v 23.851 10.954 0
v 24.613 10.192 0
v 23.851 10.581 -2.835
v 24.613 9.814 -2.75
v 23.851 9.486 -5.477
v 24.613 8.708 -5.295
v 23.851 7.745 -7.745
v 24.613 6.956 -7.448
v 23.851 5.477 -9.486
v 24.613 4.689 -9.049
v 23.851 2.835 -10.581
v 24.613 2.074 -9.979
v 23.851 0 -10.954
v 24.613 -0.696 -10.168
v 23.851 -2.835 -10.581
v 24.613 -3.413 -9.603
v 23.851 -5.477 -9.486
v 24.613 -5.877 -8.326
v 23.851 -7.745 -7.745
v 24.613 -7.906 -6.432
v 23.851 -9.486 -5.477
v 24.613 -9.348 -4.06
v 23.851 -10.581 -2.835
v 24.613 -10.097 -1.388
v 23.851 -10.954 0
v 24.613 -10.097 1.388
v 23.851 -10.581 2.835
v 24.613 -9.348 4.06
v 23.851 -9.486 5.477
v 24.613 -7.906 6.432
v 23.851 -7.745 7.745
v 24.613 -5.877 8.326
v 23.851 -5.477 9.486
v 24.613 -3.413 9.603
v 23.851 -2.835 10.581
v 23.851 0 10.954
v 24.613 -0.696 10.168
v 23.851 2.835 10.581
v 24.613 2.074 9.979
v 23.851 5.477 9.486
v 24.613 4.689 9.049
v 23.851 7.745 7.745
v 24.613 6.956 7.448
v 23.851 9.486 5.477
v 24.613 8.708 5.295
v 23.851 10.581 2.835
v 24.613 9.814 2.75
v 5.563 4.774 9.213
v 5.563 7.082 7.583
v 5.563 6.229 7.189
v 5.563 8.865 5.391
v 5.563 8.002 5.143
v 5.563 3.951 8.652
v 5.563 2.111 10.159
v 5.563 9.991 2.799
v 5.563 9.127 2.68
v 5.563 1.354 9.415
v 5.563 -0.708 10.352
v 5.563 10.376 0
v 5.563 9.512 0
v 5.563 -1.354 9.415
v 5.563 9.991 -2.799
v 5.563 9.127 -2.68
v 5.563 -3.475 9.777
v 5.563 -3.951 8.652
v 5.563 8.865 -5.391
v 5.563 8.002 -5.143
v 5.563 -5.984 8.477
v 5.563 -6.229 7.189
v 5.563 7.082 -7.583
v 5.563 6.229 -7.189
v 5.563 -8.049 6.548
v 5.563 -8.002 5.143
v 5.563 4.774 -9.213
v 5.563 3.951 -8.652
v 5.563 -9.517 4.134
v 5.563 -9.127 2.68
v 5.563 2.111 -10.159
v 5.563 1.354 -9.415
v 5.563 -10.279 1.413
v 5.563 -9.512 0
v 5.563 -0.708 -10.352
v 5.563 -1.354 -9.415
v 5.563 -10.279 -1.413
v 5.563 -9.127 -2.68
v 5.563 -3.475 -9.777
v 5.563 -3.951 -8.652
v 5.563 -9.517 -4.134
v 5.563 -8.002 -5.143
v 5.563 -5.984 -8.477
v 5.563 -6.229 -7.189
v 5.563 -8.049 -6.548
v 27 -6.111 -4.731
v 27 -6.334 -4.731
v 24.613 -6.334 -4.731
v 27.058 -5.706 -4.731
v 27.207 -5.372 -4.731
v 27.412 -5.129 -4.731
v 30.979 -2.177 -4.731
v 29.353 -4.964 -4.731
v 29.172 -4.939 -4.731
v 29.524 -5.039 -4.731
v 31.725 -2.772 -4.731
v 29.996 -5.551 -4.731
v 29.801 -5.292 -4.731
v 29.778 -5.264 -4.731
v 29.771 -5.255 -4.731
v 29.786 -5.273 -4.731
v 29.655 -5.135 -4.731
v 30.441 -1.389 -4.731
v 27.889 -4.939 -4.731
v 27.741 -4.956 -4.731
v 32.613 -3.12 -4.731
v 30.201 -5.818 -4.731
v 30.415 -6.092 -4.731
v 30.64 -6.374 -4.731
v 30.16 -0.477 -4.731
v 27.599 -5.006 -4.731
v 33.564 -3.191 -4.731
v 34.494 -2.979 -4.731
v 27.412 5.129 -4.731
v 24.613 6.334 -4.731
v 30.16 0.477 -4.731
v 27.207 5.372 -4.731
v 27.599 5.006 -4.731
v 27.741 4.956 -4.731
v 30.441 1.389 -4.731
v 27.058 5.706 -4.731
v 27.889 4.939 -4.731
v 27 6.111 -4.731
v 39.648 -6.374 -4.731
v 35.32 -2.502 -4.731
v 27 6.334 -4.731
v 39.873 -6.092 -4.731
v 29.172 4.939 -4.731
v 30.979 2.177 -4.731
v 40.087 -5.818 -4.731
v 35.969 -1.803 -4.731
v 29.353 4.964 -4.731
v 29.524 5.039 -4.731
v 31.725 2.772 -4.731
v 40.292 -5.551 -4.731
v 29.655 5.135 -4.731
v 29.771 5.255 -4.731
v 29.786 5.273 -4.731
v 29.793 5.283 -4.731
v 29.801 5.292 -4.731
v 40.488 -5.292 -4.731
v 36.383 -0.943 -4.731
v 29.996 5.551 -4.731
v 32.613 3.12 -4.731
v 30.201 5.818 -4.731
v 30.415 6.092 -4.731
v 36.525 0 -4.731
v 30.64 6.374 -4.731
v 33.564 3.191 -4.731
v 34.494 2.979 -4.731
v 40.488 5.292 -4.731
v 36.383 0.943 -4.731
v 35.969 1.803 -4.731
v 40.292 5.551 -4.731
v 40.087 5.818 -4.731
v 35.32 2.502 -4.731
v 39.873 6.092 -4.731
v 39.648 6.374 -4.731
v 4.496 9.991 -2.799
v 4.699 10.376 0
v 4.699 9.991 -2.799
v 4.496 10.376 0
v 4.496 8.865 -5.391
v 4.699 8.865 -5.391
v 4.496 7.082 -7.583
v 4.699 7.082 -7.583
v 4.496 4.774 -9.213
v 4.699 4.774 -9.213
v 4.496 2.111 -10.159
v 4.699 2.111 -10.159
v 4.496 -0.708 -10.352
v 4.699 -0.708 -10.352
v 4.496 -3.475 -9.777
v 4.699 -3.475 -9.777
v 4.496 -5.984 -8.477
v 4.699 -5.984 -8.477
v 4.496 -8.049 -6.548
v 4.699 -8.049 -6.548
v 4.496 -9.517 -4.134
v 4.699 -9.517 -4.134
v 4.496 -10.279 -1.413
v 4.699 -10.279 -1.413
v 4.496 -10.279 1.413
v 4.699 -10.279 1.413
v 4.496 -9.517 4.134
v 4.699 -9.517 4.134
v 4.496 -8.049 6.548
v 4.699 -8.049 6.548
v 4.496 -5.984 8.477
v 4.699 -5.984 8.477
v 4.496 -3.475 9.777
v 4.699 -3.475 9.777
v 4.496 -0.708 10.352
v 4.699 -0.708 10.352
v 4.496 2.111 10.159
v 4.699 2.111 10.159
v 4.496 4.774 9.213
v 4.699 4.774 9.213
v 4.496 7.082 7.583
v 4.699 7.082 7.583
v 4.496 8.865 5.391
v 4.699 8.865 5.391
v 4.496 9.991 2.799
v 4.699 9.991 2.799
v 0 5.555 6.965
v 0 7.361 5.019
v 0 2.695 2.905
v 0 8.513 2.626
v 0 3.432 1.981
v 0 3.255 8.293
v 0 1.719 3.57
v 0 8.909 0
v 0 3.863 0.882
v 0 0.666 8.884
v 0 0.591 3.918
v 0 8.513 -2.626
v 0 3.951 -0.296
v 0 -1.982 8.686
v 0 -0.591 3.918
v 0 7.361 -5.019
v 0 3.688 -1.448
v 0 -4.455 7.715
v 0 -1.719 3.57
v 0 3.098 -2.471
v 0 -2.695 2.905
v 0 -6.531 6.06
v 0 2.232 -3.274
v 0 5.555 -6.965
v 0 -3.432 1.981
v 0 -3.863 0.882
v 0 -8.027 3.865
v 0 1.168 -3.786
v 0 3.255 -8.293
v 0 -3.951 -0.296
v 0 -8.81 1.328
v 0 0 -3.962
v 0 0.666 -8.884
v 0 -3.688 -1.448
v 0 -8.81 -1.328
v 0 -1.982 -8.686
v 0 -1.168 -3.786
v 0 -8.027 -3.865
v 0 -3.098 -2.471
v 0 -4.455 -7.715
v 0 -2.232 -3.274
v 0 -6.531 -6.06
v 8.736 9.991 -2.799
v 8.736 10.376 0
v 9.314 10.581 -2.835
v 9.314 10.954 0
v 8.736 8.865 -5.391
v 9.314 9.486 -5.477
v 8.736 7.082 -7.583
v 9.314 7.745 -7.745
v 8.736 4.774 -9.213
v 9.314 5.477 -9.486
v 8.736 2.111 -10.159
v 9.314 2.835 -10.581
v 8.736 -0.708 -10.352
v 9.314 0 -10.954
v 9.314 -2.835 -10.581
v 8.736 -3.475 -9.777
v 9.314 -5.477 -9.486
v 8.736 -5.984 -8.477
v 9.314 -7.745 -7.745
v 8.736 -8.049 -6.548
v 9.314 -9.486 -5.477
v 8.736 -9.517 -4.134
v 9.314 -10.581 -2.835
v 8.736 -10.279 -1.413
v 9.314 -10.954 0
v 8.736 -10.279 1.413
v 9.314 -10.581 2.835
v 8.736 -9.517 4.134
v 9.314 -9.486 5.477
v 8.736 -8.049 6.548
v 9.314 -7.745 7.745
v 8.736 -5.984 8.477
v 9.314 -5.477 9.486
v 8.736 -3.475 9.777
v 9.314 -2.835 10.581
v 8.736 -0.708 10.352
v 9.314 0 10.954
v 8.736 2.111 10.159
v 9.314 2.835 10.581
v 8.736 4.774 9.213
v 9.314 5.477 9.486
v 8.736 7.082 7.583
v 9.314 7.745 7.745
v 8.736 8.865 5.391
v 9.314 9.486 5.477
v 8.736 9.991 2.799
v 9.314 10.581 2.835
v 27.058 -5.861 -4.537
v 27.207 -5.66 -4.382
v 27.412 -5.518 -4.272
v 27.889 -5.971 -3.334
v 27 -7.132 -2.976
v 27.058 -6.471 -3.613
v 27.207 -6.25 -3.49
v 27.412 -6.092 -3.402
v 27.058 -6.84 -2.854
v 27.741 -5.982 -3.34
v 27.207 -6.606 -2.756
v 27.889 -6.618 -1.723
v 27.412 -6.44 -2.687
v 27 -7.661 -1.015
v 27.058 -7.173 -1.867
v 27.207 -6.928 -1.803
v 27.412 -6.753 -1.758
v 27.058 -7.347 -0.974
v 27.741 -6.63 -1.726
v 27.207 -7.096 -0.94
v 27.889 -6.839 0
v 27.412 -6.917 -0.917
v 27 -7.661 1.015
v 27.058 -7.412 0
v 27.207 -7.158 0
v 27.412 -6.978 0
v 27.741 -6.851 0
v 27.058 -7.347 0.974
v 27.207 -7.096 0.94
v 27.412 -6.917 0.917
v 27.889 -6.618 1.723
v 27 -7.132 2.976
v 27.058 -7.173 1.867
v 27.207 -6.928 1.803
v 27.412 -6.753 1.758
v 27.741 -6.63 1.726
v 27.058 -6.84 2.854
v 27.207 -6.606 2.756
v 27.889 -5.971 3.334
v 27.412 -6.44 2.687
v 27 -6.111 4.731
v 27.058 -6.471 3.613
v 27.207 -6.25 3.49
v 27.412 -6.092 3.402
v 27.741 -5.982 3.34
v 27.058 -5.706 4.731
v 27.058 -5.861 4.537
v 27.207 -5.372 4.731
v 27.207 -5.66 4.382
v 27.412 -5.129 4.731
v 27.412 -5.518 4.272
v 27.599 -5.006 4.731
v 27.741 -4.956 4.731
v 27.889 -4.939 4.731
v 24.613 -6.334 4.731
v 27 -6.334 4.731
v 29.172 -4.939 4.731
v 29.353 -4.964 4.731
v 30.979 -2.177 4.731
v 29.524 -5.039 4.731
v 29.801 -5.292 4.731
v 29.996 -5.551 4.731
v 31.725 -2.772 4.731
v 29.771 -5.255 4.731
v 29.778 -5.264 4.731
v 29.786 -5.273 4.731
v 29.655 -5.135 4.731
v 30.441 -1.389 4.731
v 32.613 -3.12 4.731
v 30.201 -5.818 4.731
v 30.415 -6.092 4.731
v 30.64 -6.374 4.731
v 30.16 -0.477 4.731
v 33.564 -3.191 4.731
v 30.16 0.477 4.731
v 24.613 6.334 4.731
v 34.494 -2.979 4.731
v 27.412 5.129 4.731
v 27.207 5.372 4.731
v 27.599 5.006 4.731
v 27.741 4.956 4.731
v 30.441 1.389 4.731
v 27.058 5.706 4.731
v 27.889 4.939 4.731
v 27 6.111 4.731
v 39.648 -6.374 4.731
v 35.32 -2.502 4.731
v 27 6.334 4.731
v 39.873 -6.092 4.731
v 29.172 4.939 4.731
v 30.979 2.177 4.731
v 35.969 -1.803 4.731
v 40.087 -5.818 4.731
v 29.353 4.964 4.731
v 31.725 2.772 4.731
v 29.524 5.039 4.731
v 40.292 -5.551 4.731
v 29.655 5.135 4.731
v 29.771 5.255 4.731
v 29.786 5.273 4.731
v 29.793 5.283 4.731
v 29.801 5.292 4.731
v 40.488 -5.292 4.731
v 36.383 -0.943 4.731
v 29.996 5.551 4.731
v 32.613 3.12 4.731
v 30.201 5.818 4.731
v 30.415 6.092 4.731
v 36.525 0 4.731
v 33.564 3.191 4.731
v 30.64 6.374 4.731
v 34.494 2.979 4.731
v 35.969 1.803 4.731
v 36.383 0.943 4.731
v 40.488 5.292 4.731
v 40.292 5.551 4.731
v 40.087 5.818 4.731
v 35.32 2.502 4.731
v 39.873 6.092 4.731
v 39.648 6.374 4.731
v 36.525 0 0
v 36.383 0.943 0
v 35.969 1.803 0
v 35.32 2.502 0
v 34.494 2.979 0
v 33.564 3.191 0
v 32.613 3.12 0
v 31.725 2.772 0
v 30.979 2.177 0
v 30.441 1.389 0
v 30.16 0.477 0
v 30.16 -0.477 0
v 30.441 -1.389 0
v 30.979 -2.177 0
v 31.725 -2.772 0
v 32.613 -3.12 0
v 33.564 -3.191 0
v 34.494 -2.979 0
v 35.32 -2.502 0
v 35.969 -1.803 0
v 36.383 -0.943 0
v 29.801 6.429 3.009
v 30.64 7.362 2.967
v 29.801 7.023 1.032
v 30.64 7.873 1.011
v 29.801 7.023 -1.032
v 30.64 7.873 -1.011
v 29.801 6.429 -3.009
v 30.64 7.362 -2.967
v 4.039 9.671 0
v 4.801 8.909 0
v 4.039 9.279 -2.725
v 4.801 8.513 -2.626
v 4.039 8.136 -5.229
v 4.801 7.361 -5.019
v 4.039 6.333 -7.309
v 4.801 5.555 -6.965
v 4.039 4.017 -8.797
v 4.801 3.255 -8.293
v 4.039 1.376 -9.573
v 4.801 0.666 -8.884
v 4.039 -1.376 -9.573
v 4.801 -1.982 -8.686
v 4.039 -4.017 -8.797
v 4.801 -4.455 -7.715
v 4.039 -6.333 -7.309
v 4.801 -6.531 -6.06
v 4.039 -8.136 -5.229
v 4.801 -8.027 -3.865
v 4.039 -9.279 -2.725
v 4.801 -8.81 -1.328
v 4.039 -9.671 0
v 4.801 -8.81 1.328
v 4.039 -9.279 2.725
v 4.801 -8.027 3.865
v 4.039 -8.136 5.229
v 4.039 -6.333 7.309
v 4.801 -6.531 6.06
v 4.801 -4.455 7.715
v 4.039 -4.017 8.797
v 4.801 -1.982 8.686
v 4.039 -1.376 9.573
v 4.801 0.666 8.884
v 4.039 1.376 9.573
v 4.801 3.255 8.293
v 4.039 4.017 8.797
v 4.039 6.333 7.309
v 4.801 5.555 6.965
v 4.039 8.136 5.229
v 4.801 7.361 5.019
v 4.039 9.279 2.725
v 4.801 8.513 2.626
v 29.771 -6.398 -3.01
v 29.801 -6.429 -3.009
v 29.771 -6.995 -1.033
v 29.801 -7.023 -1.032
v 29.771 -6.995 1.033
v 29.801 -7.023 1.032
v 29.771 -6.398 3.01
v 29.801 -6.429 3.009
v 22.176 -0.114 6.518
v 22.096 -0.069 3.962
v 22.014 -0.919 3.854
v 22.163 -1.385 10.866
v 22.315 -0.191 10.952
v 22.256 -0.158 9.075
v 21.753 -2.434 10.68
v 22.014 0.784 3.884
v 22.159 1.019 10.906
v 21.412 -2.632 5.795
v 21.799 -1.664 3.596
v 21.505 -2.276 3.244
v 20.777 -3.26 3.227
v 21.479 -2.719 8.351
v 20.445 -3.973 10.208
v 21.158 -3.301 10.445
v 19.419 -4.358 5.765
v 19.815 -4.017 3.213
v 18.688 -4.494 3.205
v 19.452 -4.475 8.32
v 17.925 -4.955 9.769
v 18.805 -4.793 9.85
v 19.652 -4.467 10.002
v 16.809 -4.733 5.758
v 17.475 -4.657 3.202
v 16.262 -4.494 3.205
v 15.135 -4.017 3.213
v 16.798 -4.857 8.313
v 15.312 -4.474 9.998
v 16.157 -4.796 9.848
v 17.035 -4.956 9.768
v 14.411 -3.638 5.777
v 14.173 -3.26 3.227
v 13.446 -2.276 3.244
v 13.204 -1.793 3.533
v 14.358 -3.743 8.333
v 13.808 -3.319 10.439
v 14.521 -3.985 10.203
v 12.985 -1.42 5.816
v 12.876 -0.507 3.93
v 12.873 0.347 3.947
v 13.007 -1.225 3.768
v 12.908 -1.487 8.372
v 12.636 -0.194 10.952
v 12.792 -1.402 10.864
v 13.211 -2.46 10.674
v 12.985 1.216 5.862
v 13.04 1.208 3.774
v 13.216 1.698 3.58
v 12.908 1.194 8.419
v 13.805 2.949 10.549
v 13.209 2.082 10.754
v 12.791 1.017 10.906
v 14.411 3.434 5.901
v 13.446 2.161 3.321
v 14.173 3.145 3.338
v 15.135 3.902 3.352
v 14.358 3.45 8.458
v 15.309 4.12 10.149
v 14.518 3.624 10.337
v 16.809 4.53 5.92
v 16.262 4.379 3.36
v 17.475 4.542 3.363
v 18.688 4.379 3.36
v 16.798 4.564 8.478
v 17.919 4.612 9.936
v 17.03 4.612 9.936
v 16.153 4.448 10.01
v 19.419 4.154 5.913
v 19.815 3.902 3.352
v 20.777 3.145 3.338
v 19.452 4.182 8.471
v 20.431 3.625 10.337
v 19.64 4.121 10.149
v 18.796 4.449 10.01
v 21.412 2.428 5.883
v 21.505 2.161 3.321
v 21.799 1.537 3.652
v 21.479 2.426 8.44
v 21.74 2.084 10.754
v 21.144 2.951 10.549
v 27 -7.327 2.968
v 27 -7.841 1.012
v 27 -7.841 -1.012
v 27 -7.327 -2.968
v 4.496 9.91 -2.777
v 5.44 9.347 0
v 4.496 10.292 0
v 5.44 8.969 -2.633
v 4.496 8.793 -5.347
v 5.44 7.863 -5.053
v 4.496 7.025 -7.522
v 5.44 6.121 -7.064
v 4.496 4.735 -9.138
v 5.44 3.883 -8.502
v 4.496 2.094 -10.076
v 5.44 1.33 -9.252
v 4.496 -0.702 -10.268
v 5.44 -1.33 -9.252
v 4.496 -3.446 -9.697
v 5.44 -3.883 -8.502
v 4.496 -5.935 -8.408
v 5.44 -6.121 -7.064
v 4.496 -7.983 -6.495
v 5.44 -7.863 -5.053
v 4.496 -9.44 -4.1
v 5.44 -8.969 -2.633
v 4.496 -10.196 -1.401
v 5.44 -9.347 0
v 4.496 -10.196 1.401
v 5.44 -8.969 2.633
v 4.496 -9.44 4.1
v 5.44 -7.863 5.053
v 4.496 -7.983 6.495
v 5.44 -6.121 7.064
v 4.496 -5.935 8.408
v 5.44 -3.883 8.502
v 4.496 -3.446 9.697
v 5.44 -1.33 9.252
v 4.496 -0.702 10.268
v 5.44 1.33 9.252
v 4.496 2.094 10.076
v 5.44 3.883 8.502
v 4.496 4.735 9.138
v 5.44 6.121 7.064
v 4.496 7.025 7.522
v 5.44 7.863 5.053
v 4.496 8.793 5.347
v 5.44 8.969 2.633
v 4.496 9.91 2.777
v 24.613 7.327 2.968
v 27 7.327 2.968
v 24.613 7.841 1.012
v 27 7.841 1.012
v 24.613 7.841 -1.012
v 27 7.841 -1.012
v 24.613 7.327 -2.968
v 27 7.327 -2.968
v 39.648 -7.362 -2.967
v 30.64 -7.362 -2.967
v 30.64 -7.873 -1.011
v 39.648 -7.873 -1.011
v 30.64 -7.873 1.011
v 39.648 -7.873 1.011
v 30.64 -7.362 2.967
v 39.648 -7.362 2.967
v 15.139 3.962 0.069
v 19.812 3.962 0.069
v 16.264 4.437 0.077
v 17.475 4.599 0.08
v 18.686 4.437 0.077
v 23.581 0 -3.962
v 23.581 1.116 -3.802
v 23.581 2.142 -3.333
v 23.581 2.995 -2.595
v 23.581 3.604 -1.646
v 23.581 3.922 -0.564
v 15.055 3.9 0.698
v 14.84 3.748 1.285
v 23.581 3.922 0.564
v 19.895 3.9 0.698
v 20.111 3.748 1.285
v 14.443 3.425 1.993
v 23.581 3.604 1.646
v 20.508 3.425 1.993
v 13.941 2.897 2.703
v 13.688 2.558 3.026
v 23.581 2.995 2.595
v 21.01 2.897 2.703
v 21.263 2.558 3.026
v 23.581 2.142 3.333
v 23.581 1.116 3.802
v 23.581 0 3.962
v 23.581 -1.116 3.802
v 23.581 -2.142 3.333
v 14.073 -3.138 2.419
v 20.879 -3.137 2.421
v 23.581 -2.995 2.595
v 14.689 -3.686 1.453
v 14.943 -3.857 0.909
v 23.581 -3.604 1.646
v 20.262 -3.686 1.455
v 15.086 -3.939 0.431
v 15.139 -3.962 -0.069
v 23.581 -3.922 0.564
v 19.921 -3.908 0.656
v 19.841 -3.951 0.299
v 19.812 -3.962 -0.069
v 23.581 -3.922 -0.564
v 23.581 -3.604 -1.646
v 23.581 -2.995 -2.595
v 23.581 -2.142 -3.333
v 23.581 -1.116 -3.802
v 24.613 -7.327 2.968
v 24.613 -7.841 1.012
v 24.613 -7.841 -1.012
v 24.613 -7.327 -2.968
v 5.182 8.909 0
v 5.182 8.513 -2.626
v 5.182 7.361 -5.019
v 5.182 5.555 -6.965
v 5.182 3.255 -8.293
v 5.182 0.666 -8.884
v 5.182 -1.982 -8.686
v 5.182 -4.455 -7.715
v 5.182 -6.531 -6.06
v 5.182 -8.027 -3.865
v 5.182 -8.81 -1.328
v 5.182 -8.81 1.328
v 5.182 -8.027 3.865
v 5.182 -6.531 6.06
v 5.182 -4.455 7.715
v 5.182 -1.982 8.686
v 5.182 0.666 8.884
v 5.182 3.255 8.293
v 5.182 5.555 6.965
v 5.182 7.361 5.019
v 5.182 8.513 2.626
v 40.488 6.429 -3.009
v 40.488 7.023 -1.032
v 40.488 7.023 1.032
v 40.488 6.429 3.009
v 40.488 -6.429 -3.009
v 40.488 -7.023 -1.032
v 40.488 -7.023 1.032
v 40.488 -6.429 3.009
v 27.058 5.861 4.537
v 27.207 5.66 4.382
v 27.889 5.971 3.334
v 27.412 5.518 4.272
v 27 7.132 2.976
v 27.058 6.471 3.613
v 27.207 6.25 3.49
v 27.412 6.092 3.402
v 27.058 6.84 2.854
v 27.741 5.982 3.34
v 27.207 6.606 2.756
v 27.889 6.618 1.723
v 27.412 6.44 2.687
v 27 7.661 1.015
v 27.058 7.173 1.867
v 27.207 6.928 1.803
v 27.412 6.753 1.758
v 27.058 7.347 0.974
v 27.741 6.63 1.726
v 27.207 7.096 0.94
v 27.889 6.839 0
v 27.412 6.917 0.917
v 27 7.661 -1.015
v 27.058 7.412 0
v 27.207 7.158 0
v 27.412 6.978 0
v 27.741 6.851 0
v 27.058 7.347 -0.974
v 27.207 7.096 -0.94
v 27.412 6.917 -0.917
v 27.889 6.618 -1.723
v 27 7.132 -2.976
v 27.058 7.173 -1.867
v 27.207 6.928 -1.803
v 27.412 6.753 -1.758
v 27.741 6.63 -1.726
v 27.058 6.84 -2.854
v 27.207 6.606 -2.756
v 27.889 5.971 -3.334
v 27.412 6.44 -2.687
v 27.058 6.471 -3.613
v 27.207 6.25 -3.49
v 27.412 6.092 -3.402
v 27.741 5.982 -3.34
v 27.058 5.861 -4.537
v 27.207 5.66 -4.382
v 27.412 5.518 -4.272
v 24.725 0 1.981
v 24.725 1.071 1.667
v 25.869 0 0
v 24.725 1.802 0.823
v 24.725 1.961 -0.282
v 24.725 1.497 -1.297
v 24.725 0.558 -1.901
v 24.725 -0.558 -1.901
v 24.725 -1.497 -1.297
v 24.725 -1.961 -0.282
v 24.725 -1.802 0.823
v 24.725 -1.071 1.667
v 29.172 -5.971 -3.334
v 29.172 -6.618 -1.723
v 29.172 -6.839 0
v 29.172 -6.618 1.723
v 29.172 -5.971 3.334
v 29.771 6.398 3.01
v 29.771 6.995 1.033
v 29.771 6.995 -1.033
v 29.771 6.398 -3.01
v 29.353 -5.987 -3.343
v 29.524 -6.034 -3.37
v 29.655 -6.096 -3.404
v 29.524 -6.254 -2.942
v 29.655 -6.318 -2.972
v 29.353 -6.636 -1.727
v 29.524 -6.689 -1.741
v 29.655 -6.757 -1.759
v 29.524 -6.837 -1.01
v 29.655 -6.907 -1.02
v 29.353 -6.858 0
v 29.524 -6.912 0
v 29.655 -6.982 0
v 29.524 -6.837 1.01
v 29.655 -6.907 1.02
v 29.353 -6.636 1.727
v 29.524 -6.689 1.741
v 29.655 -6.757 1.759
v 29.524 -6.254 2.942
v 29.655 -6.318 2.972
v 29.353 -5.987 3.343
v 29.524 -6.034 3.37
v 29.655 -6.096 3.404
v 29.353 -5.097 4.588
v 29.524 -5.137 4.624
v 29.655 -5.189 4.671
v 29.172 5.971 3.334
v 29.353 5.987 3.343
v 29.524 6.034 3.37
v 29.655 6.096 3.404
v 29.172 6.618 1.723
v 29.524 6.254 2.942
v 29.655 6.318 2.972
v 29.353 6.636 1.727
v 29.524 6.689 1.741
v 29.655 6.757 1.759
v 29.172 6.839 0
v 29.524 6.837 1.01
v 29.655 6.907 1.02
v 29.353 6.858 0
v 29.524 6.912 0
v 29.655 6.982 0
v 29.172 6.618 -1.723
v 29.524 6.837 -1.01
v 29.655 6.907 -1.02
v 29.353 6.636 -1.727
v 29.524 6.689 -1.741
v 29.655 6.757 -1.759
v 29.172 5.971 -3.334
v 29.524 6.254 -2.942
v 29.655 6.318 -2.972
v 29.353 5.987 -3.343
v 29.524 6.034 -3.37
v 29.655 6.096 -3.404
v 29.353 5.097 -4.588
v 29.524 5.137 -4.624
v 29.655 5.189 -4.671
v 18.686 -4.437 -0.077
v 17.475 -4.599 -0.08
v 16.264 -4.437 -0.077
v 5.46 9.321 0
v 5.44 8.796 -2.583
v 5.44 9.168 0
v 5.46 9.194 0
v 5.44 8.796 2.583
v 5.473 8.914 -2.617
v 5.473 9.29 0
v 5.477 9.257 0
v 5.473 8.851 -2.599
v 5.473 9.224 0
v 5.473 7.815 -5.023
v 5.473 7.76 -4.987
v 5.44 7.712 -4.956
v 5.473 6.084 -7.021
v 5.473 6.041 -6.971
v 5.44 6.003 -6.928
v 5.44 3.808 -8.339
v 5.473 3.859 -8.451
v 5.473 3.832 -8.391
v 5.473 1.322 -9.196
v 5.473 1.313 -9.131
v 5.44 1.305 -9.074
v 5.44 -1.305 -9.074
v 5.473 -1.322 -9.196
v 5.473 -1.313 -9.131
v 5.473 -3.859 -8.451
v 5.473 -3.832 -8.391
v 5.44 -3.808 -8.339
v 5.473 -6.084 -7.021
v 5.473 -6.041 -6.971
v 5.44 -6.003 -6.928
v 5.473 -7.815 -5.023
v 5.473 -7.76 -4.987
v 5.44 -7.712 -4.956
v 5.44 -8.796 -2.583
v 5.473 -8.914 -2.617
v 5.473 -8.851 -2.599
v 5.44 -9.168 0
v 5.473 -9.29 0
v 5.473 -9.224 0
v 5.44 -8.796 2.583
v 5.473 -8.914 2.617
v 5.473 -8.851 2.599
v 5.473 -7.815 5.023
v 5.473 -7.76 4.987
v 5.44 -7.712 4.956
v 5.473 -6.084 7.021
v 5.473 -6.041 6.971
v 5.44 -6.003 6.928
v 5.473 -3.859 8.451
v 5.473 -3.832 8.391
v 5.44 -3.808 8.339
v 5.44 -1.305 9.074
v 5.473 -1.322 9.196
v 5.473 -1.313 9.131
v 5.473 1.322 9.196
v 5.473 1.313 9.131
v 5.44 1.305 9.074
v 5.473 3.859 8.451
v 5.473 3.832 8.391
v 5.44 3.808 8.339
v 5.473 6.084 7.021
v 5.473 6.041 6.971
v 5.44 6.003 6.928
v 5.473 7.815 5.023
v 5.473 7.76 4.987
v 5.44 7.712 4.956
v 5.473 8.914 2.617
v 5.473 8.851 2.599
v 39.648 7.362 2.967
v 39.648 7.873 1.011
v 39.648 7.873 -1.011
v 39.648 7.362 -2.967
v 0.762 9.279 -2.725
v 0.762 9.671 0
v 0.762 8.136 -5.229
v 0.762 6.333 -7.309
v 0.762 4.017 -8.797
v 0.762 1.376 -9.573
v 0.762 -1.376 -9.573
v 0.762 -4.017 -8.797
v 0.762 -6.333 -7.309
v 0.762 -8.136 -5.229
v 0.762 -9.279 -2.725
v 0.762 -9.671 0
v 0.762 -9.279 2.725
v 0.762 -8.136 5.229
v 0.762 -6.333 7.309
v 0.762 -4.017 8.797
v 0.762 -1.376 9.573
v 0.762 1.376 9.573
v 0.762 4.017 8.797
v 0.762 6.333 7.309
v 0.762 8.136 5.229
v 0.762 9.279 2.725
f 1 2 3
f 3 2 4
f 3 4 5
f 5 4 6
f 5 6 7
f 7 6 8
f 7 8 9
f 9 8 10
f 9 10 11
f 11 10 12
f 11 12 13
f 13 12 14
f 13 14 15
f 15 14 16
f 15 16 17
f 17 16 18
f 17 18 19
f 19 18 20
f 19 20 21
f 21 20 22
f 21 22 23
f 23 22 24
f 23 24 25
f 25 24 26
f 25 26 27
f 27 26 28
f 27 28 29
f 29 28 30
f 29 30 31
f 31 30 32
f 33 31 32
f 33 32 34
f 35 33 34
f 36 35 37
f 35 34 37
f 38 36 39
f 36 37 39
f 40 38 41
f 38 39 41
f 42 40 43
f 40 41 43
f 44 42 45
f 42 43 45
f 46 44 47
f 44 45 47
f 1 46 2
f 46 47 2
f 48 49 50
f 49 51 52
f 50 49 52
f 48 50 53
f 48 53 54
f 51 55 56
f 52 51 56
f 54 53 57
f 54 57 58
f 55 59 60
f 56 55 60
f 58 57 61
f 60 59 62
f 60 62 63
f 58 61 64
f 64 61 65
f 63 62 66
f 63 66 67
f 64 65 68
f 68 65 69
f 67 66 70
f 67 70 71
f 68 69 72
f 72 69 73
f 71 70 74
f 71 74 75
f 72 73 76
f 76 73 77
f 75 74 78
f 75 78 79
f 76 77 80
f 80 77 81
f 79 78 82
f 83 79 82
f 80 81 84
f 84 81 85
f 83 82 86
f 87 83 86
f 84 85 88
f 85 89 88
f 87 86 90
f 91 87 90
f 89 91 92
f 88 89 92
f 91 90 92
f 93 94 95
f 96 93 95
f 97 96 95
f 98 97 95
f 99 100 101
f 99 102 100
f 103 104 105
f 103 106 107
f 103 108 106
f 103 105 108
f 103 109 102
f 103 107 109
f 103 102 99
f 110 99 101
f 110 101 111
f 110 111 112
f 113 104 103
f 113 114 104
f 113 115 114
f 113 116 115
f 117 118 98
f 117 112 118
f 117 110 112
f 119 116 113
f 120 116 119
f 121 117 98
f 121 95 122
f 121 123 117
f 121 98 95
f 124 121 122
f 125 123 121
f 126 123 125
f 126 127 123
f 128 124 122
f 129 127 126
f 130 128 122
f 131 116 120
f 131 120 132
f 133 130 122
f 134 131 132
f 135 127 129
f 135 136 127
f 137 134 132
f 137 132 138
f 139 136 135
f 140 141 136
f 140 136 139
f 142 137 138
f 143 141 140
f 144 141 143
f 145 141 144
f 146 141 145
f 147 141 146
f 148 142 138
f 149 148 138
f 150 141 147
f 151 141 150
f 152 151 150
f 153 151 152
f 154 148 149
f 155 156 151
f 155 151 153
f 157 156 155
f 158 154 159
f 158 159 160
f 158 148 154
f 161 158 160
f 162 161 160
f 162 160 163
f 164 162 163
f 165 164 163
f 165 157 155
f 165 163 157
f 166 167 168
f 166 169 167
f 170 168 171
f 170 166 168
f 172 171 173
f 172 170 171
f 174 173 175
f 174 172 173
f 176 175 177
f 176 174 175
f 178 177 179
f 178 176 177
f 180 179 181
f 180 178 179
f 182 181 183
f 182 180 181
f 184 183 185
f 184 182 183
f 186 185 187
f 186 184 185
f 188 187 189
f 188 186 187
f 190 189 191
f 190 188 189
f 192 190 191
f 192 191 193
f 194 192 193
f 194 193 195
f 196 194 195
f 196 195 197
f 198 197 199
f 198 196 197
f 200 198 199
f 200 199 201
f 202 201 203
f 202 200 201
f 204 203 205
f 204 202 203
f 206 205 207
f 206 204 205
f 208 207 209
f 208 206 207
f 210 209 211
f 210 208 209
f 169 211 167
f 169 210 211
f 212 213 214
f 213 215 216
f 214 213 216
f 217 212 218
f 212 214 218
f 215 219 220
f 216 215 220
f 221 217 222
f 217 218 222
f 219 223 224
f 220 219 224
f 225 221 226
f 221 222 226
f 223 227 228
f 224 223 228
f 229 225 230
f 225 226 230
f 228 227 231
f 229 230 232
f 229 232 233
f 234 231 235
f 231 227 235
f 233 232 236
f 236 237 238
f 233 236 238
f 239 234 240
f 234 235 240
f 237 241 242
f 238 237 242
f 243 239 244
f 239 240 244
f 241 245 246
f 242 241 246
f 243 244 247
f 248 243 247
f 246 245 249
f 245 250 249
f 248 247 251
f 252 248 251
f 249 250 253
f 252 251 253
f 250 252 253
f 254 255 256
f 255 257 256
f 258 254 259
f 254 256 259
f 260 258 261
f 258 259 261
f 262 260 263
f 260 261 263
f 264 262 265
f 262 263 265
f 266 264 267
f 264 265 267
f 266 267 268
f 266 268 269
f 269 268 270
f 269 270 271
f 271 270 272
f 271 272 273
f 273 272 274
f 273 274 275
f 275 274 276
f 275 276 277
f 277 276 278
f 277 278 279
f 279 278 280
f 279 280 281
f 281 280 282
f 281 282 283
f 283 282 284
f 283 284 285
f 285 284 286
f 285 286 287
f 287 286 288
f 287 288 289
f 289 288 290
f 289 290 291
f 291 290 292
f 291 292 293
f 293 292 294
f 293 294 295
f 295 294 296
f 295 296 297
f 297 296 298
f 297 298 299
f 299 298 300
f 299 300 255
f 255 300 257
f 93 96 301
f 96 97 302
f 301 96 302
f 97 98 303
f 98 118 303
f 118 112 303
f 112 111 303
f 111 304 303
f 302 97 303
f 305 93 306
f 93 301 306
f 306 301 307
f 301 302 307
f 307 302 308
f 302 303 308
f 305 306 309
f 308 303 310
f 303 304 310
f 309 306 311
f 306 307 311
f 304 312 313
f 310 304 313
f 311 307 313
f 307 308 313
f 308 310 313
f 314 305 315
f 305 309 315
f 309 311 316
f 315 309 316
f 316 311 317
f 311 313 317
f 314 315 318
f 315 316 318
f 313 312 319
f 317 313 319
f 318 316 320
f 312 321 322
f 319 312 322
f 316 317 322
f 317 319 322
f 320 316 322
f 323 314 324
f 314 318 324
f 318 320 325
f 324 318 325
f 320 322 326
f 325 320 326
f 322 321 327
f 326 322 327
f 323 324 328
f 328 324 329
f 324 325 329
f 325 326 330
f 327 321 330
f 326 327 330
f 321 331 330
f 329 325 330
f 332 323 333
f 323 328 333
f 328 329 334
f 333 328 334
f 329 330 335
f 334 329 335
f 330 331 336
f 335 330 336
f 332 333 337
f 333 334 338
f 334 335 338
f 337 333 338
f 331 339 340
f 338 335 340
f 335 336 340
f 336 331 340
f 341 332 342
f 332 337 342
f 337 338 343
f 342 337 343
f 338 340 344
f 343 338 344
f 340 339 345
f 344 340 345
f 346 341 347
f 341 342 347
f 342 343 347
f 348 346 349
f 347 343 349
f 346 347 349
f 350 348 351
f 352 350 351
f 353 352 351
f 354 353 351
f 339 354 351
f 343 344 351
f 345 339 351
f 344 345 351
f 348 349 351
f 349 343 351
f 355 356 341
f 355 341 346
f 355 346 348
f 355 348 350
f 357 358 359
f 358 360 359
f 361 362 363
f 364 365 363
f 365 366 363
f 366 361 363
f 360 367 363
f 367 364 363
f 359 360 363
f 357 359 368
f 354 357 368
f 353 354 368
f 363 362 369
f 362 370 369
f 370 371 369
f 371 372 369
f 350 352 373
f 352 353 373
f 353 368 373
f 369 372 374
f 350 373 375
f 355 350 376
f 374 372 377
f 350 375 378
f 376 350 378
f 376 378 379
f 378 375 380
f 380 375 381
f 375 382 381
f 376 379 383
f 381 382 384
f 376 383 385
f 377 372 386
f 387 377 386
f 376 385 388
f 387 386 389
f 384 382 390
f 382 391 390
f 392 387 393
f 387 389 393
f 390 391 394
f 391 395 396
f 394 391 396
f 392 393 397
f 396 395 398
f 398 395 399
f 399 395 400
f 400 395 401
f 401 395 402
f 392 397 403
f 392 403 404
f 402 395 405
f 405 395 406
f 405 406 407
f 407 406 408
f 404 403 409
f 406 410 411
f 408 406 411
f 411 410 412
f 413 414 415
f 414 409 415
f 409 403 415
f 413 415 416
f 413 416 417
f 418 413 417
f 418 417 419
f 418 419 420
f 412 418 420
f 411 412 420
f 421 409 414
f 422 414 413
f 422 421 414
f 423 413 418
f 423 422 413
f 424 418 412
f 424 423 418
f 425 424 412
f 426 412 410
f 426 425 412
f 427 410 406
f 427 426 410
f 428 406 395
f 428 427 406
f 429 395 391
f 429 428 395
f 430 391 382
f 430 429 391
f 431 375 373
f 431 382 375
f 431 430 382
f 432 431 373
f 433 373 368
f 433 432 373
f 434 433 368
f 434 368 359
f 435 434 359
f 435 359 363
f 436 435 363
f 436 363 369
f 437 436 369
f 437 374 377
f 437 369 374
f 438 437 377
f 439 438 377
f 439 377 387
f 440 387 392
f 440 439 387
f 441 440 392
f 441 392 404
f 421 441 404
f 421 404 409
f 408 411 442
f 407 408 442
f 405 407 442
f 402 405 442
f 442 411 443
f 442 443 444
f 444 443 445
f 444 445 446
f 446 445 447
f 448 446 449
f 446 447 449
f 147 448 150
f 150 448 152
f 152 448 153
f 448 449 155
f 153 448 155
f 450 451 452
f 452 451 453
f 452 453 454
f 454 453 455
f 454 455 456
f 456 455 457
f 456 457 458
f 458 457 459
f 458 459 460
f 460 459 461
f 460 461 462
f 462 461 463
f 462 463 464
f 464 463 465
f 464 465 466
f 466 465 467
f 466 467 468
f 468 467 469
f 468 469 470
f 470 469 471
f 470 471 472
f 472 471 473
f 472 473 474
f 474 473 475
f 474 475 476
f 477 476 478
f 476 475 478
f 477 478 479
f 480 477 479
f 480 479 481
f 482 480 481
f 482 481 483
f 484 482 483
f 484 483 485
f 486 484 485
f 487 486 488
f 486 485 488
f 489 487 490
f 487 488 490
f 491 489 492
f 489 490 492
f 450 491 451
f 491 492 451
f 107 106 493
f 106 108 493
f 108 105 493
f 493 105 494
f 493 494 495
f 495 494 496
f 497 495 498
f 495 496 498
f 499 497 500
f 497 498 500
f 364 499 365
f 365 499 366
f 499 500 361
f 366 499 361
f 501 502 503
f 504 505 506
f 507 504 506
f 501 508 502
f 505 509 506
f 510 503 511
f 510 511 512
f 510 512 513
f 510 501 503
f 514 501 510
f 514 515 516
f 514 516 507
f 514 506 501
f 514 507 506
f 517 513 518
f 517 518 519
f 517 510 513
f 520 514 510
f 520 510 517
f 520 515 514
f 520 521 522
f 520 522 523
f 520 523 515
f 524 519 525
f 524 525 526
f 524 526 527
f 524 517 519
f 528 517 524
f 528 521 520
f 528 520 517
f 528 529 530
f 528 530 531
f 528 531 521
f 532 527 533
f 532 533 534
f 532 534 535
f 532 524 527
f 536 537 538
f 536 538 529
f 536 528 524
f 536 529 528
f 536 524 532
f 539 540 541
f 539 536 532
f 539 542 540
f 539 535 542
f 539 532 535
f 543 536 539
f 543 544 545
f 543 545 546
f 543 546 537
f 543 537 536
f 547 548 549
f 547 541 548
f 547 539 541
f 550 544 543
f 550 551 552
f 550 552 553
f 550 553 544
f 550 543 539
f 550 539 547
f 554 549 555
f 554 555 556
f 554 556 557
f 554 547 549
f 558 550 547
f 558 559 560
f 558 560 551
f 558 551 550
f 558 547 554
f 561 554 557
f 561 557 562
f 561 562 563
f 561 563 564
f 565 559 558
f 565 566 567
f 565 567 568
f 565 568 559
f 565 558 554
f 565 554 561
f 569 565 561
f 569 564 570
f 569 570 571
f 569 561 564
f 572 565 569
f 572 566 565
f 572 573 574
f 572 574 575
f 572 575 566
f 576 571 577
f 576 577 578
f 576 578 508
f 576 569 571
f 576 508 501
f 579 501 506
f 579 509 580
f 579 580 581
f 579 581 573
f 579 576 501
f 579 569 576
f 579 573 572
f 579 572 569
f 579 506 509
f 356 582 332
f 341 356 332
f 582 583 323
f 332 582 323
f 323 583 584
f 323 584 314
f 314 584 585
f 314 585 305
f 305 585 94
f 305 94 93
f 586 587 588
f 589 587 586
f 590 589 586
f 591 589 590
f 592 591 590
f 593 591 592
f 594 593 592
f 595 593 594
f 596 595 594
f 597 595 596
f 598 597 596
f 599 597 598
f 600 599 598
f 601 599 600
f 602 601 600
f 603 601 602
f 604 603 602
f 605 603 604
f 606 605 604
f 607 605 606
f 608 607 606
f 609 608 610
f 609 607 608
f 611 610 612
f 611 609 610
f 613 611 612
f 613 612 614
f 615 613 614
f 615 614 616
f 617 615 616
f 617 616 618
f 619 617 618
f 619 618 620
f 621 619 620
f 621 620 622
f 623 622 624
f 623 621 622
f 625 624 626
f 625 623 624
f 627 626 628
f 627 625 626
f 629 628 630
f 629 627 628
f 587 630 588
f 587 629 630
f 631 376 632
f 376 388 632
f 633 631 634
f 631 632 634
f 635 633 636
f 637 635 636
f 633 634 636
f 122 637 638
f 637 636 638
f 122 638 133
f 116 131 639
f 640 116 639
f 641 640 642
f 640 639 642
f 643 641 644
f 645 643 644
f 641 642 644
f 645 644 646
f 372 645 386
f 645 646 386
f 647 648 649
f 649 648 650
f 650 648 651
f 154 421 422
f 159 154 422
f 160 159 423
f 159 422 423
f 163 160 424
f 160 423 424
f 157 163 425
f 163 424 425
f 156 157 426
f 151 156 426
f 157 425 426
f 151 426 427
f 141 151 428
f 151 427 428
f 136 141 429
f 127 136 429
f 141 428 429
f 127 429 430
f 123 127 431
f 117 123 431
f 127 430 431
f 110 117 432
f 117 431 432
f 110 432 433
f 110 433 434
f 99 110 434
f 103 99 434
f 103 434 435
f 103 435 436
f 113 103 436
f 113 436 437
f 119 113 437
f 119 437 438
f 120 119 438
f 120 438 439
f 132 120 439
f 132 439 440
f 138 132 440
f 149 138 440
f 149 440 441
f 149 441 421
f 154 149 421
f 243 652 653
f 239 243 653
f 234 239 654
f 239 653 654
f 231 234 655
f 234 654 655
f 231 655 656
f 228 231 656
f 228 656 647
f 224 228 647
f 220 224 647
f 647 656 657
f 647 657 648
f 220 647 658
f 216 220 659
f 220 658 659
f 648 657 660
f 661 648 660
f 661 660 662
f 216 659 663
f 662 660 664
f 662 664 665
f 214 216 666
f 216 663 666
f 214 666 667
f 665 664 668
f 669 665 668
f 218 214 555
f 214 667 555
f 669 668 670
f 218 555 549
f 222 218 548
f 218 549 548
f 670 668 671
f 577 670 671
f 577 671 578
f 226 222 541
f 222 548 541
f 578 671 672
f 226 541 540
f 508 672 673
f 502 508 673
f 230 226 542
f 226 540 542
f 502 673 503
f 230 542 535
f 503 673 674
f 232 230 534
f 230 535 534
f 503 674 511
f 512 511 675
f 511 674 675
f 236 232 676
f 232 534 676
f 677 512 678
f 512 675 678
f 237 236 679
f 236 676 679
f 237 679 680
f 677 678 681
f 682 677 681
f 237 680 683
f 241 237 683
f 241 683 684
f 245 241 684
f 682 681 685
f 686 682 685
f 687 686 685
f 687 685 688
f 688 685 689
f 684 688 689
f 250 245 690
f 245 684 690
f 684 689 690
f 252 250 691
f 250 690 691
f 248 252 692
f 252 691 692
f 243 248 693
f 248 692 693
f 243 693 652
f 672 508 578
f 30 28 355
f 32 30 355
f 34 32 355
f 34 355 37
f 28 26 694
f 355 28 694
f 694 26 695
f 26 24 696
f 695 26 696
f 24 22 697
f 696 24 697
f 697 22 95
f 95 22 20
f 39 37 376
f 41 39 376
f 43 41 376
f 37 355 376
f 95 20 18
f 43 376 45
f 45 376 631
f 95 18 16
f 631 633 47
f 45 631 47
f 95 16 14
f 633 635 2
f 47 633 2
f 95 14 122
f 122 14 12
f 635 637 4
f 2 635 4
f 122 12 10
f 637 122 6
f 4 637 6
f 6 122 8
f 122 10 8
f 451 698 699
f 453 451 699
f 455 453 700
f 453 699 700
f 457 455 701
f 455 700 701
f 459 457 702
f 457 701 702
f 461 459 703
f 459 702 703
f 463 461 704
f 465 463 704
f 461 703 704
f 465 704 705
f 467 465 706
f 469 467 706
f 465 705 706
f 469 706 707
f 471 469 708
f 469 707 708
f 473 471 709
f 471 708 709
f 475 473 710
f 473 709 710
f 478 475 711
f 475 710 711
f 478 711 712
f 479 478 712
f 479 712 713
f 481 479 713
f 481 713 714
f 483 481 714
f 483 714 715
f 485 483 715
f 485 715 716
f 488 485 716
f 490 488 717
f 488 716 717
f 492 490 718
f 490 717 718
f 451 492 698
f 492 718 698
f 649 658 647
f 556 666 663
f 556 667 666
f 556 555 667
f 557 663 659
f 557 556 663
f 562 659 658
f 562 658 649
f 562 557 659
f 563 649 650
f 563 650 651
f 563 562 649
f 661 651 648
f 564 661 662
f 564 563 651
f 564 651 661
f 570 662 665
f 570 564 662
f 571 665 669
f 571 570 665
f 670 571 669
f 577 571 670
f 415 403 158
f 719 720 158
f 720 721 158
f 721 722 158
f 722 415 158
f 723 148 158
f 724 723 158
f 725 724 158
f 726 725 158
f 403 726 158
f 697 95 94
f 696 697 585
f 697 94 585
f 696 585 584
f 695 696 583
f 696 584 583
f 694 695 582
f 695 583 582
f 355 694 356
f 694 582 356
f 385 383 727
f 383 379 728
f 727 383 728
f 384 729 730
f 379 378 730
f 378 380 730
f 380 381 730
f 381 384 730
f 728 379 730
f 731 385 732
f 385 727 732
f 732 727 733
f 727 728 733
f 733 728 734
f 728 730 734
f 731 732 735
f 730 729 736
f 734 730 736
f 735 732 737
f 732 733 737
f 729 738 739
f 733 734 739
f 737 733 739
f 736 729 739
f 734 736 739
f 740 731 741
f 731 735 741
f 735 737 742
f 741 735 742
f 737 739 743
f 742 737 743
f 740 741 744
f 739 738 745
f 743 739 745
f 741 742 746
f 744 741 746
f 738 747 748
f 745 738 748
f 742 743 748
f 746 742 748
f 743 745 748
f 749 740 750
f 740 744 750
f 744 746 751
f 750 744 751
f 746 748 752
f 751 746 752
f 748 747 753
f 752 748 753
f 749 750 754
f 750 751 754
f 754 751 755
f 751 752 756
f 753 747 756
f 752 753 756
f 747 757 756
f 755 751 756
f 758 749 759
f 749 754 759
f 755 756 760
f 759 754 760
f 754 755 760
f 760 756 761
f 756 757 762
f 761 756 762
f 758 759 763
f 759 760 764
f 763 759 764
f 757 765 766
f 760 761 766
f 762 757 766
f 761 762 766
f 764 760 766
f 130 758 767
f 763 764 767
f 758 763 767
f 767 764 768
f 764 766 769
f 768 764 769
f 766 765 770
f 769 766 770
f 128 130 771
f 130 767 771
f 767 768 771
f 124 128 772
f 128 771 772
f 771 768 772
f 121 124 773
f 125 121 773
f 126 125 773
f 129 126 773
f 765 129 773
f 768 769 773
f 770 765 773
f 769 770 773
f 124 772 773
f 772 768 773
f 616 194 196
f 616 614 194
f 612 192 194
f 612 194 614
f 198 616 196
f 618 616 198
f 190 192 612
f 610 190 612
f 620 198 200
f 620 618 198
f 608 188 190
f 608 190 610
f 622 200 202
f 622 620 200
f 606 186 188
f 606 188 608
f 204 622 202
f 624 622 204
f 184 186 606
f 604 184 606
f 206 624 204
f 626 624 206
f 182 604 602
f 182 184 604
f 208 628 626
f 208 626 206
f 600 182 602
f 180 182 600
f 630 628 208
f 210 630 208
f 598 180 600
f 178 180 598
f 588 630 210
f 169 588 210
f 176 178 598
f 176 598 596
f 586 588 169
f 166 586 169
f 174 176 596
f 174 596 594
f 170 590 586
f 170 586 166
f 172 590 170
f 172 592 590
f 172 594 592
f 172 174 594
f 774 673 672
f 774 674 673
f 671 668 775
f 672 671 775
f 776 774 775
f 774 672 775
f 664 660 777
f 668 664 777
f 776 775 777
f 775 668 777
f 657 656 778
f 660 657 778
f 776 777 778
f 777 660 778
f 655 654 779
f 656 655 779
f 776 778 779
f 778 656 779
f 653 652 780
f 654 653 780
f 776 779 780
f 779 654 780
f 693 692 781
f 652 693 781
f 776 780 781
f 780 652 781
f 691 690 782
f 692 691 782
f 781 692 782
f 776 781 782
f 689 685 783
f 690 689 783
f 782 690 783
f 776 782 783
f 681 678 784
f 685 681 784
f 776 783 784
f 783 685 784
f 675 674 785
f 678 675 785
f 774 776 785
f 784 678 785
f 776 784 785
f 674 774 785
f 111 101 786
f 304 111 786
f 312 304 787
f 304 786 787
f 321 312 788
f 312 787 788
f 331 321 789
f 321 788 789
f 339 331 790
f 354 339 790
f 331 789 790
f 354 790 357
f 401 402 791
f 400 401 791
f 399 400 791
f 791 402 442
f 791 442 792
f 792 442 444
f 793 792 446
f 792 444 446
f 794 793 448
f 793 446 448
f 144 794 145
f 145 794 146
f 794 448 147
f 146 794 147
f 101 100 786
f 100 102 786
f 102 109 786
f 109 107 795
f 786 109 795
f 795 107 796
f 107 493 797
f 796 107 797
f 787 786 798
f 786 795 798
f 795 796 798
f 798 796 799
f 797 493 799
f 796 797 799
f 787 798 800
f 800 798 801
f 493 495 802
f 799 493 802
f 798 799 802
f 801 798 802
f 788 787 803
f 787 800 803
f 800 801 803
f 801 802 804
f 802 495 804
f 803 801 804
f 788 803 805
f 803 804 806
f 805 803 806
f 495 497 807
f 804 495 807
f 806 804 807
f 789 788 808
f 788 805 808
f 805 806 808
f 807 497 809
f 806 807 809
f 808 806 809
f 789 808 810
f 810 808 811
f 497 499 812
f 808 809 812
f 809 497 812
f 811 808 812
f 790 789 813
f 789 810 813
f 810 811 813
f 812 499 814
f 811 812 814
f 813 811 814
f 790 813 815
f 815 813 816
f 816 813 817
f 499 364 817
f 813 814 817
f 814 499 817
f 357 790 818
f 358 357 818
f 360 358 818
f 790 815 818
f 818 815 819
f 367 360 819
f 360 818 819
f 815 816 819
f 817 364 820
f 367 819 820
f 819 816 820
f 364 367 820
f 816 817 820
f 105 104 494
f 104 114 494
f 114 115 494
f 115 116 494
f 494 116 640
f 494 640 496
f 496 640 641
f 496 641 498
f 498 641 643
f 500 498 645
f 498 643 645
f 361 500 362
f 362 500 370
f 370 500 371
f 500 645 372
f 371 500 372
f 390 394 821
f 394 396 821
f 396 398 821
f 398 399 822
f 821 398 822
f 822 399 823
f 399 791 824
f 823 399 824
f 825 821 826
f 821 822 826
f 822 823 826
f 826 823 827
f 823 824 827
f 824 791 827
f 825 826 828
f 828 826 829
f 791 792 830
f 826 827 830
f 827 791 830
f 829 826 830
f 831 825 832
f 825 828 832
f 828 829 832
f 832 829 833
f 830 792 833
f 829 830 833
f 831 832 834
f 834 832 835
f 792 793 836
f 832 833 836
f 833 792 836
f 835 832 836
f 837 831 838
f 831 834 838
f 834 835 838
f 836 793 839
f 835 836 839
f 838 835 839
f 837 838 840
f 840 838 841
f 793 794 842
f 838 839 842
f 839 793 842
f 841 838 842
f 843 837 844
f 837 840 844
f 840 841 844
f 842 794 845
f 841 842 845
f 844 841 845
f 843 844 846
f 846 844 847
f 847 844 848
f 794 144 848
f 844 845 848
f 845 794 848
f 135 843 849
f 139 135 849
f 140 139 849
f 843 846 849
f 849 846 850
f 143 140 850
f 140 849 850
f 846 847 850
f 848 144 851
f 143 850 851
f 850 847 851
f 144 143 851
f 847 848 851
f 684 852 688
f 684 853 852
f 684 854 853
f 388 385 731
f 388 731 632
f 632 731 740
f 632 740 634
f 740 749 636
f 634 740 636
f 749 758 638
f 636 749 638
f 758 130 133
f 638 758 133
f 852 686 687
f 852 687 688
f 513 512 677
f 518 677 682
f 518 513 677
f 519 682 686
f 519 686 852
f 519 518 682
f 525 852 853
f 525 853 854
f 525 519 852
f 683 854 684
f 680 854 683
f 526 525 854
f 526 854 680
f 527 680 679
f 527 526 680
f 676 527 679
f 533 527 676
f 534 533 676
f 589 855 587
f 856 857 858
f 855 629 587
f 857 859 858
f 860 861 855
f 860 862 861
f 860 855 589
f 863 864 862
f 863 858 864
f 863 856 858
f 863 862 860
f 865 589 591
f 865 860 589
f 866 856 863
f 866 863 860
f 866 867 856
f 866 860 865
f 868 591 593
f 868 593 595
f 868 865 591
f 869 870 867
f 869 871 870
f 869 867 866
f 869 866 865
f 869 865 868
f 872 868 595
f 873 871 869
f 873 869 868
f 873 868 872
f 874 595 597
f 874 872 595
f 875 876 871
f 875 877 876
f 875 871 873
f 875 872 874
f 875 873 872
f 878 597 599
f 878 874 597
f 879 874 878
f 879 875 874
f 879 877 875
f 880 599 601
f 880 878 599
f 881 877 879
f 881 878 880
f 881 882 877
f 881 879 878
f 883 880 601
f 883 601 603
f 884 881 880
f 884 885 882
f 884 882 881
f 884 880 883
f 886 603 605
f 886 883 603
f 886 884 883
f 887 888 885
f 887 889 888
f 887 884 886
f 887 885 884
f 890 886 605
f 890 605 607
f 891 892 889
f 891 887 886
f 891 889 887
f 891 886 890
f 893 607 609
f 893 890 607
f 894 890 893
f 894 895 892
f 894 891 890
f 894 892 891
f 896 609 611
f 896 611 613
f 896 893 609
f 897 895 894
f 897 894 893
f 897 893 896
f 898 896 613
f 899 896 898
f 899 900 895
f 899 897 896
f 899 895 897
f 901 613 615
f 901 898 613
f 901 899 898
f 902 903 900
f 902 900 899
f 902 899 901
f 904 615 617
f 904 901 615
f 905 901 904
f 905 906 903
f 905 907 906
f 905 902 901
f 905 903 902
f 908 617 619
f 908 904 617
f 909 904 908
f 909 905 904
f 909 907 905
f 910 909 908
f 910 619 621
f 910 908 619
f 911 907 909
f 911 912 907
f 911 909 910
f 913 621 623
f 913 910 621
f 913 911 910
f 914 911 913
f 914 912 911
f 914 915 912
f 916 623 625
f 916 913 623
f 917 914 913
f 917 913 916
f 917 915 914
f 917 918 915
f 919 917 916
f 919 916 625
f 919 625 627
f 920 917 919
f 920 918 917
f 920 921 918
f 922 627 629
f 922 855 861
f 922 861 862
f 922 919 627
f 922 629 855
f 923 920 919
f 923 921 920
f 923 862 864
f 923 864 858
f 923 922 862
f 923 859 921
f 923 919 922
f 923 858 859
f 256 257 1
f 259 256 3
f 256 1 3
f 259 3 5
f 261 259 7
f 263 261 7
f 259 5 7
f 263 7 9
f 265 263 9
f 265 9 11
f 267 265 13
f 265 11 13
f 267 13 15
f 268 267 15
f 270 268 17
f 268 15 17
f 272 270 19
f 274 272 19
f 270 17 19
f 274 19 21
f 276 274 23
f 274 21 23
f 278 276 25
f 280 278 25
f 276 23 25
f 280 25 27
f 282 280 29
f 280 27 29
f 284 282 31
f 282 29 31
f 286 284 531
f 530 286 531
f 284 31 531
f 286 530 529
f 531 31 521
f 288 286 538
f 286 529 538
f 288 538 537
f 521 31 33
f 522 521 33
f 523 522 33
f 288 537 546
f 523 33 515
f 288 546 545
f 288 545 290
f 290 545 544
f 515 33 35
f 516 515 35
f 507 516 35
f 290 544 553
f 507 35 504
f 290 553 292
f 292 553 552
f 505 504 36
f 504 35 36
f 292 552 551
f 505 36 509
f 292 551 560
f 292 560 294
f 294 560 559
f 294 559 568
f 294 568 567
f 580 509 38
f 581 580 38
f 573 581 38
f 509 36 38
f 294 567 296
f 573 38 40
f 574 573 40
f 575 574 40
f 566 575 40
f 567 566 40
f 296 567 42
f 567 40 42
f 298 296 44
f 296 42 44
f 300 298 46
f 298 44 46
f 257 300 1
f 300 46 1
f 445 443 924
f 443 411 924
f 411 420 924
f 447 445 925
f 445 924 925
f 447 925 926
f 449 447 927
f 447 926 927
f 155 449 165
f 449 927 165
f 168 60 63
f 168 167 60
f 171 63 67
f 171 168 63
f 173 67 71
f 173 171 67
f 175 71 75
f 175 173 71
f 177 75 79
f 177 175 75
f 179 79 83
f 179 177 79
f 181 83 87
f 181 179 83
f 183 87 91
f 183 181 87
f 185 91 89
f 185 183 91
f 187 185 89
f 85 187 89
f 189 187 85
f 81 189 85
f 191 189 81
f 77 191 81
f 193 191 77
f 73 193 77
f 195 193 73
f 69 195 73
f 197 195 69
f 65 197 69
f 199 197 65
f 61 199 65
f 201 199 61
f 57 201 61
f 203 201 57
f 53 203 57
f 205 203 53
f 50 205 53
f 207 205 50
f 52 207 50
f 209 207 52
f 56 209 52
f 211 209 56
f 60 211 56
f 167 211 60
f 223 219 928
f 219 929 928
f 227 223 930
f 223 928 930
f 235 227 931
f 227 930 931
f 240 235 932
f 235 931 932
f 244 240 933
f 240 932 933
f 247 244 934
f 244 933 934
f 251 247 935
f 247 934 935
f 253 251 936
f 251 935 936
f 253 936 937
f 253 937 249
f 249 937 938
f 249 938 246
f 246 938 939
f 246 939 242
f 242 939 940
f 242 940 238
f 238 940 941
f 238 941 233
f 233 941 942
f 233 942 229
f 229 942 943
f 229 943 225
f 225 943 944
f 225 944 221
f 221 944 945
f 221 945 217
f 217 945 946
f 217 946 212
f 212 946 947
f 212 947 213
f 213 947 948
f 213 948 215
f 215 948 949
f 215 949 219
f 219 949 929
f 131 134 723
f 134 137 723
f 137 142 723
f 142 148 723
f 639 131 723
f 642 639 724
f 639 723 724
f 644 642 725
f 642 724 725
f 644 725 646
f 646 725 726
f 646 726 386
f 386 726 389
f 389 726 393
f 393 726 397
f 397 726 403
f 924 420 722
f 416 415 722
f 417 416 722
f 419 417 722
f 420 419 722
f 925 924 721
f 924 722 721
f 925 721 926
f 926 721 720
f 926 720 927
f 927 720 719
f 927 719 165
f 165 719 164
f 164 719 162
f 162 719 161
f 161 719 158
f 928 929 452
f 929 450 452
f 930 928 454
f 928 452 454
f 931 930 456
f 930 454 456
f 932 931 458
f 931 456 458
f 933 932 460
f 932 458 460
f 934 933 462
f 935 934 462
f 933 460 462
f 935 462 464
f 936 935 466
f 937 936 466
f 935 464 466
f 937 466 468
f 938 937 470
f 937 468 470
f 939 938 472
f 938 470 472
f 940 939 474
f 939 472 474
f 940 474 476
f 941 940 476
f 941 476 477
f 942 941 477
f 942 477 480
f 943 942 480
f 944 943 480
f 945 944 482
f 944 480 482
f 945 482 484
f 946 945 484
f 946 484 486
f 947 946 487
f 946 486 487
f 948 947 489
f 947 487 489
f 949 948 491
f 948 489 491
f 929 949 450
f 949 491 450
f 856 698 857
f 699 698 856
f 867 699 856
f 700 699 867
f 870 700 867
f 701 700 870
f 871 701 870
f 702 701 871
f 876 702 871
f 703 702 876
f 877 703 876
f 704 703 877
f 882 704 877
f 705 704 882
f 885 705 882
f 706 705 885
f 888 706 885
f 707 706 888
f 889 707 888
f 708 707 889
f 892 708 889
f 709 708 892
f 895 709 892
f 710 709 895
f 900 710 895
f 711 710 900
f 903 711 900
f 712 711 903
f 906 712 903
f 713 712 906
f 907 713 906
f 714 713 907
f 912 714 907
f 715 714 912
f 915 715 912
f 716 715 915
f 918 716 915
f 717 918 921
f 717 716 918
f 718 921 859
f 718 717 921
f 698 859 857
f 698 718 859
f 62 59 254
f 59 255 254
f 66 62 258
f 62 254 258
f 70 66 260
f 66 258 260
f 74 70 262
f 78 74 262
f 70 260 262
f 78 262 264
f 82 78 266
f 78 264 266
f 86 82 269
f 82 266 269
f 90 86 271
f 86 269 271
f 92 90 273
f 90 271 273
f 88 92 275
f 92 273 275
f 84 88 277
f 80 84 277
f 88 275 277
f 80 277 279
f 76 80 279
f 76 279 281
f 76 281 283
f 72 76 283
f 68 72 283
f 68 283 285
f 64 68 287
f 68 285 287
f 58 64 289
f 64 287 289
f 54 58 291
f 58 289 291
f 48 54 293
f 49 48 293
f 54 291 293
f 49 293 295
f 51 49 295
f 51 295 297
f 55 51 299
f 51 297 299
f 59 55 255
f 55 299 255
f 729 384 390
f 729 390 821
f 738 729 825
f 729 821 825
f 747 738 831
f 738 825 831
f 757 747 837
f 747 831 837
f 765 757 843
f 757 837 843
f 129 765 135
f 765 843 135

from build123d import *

# Parameters (mm, degrees)
SKETCH3_W               = 43.815
SKETCH3_H               = 87.63
SKETCH3_W_2             = 9.4615
SKETCH3_H_2             = 43.815
CUT_EXTRUDE1_DEPTH      = 15.875
HOLE1_D                 = 7.9248
HOLE1_DEPTH             = 23.58136
HOLE1_TIP               = 2.287692707
CUT_EXTRUDE2_DEPTH      = 7.096125
CUT_EXTRUDE2_DEPTH_BACK = 7.096125
SKETCH8_R               = 3.2004


with BuildPart() as part:
    # Sketch1 → Revolve1 (revolve)
    with BuildSketch(Plane.XY):
        Polygon((0, 0), (0, 8.90905), (0.762, 9.67105), (4.0386, 9.67105), (4.8006, 8.90905), (5.5626, 8.90905), (5.5626, 10.3759), (8.73633, 10.3759), (9.31418, 10.95375), (23.8506, 10.95375), (24.6126, 10.19175), (24.6126, 0), align=None)
    revolve(axis=Axis((24.6126, 0, 0), (-1, 0, 0)))

    # Sketch2 → Revolve2 (revolve)
    with BuildSketch(Plane.XY):
        with BuildLine():
            Line((24.6126, 0), (24.6126, 7.90575))
            Line((24.6126, 7.90575), (27.0002, 7.90575))
            Line((27.0002, 7.90575), (27.0002, 7.72795))
            ThreePointArc((27.0002, 7.72795), (27.260582072, 7.099332072), (27.8892, 6.83895))
            Line((27.8892, 6.83895), (29.1719, 6.83895))
            ThreePointArc((29.1719, 6.83895), (29.49290348, 6.898927826), (29.77059292, 7.0707683))
            Line((29.77059292, 7.0707683), (29.800517928, 7.09803))
            Line((29.800517928, 7.09803), (30.639987928, 7.9375))
            Line((30.639987928, 7.9375), (39.64813, 7.9375))
            Line((39.64813, 7.9375), (40.4876, 7.09803))
            Line((40.4876, 7.09803), (40.4876, 0))
            Line((40.4876, 0), (24.6126, 0))
        make_face()
    revolve(axis=Axis((40.4876, 0, 0), (-1, 0, 0)))

    # Sketch3 → Cut-Extrude1 (cut)
    with BuildSketch(Plane(origin=(40.4876, 0, 0), x_dir=(0, 0, -1), z_dir=(1, 0, 0))):
        Rectangle(SKETCH3_W, SKETCH3_H)
        Rectangle(SKETCH3_W_2, SKETCH3_H_2, mode=Mode.SUBTRACT)
    extrude(amount=-CUT_EXTRUDE1_DEPTH, mode=Mode.SUBTRACT)

    # Hole1
    with Locations(Plane.ZY):
        with Locations((0, 0)):
            Hole(HOLE1_D / 2, depth=HOLE1_DEPTH)
            with Locations((0, 0, -(HOLE1_DEPTH + HOLE1_TIP / 2))):  # 120° drill point
                Cone(0, HOLE1_D / 2, HOLE1_TIP, mode=Mode.SUBTRACT)

    # Sketch6 → Cut-Revolve1 (revolve, cut)
    with BuildSketch(Plane(origin=(0, 0, 0), x_dir=(1, 0, 0), z_dir=(0, 0.9998476951563913, 0.01745240643728403))):
        Polygon((17.4752, 0), (22.075197063, 0), (22.075197063, -3.28295), (22.314675925, -10.95375), (17.4752, -10.95375), align=None)
    revolve(axis=Axis((17.4752, -0.191169297, 10.952081691), (0, 0.01745240643728403, -0.9998476951563913)), mode=Mode.SUBTRACT)

    # Sketch7 → Revolve3 (revolve)
    with BuildSketch(Plane.XY):
        with BuildLine():
            Line((4.49554893, 10.291731804), (5.440112806, 9.347167928))
            ThreePointArc((5.440112806, 9.347167928), (5.477310245, 9.257365367), (5.440112806, 9.167562806))
            Line((5.440112806, 9.167562806), (5.1816, 8.90905))
            Line((5.1816, 8.90905), (4.8006, 8.90905))
            Line((4.8006, 8.90905), (4.8006, 8.65505))
            Line((4.8006, 8.65505), (5.5626, 8.65505))
            Line((5.5626, 8.65505), (5.5626, 9.51204893))
            Line((5.5626, 9.51204893), (4.69874893, 10.3759))
            Line((4.69874893, 10.3759), (4.49554893, 10.3759))
            Line((4.49554893, 10.3759), (4.49554893, 10.291731804))
        make_face()
    revolve(axis=Axis((5.5626, 0, 0), (-1, 0, 0)))

    # Sketch8 → Cut-Extrude2 (cut, two sides: drawn at the far end of the back side and taken through both)
    with BuildSketch(Plane.XY.offset(-CUT_EXTRUDE2_DEPTH_BACK)):
        with Locations((33.3248, 0)):
            Circle(SKETCH8_R)
    extrude(amount=CUT_EXTRUDE2_DEPTH + CUT_EXTRUDE2_DEPTH_BACK, mode=Mode.SUBTRACT)


solid = part.part
